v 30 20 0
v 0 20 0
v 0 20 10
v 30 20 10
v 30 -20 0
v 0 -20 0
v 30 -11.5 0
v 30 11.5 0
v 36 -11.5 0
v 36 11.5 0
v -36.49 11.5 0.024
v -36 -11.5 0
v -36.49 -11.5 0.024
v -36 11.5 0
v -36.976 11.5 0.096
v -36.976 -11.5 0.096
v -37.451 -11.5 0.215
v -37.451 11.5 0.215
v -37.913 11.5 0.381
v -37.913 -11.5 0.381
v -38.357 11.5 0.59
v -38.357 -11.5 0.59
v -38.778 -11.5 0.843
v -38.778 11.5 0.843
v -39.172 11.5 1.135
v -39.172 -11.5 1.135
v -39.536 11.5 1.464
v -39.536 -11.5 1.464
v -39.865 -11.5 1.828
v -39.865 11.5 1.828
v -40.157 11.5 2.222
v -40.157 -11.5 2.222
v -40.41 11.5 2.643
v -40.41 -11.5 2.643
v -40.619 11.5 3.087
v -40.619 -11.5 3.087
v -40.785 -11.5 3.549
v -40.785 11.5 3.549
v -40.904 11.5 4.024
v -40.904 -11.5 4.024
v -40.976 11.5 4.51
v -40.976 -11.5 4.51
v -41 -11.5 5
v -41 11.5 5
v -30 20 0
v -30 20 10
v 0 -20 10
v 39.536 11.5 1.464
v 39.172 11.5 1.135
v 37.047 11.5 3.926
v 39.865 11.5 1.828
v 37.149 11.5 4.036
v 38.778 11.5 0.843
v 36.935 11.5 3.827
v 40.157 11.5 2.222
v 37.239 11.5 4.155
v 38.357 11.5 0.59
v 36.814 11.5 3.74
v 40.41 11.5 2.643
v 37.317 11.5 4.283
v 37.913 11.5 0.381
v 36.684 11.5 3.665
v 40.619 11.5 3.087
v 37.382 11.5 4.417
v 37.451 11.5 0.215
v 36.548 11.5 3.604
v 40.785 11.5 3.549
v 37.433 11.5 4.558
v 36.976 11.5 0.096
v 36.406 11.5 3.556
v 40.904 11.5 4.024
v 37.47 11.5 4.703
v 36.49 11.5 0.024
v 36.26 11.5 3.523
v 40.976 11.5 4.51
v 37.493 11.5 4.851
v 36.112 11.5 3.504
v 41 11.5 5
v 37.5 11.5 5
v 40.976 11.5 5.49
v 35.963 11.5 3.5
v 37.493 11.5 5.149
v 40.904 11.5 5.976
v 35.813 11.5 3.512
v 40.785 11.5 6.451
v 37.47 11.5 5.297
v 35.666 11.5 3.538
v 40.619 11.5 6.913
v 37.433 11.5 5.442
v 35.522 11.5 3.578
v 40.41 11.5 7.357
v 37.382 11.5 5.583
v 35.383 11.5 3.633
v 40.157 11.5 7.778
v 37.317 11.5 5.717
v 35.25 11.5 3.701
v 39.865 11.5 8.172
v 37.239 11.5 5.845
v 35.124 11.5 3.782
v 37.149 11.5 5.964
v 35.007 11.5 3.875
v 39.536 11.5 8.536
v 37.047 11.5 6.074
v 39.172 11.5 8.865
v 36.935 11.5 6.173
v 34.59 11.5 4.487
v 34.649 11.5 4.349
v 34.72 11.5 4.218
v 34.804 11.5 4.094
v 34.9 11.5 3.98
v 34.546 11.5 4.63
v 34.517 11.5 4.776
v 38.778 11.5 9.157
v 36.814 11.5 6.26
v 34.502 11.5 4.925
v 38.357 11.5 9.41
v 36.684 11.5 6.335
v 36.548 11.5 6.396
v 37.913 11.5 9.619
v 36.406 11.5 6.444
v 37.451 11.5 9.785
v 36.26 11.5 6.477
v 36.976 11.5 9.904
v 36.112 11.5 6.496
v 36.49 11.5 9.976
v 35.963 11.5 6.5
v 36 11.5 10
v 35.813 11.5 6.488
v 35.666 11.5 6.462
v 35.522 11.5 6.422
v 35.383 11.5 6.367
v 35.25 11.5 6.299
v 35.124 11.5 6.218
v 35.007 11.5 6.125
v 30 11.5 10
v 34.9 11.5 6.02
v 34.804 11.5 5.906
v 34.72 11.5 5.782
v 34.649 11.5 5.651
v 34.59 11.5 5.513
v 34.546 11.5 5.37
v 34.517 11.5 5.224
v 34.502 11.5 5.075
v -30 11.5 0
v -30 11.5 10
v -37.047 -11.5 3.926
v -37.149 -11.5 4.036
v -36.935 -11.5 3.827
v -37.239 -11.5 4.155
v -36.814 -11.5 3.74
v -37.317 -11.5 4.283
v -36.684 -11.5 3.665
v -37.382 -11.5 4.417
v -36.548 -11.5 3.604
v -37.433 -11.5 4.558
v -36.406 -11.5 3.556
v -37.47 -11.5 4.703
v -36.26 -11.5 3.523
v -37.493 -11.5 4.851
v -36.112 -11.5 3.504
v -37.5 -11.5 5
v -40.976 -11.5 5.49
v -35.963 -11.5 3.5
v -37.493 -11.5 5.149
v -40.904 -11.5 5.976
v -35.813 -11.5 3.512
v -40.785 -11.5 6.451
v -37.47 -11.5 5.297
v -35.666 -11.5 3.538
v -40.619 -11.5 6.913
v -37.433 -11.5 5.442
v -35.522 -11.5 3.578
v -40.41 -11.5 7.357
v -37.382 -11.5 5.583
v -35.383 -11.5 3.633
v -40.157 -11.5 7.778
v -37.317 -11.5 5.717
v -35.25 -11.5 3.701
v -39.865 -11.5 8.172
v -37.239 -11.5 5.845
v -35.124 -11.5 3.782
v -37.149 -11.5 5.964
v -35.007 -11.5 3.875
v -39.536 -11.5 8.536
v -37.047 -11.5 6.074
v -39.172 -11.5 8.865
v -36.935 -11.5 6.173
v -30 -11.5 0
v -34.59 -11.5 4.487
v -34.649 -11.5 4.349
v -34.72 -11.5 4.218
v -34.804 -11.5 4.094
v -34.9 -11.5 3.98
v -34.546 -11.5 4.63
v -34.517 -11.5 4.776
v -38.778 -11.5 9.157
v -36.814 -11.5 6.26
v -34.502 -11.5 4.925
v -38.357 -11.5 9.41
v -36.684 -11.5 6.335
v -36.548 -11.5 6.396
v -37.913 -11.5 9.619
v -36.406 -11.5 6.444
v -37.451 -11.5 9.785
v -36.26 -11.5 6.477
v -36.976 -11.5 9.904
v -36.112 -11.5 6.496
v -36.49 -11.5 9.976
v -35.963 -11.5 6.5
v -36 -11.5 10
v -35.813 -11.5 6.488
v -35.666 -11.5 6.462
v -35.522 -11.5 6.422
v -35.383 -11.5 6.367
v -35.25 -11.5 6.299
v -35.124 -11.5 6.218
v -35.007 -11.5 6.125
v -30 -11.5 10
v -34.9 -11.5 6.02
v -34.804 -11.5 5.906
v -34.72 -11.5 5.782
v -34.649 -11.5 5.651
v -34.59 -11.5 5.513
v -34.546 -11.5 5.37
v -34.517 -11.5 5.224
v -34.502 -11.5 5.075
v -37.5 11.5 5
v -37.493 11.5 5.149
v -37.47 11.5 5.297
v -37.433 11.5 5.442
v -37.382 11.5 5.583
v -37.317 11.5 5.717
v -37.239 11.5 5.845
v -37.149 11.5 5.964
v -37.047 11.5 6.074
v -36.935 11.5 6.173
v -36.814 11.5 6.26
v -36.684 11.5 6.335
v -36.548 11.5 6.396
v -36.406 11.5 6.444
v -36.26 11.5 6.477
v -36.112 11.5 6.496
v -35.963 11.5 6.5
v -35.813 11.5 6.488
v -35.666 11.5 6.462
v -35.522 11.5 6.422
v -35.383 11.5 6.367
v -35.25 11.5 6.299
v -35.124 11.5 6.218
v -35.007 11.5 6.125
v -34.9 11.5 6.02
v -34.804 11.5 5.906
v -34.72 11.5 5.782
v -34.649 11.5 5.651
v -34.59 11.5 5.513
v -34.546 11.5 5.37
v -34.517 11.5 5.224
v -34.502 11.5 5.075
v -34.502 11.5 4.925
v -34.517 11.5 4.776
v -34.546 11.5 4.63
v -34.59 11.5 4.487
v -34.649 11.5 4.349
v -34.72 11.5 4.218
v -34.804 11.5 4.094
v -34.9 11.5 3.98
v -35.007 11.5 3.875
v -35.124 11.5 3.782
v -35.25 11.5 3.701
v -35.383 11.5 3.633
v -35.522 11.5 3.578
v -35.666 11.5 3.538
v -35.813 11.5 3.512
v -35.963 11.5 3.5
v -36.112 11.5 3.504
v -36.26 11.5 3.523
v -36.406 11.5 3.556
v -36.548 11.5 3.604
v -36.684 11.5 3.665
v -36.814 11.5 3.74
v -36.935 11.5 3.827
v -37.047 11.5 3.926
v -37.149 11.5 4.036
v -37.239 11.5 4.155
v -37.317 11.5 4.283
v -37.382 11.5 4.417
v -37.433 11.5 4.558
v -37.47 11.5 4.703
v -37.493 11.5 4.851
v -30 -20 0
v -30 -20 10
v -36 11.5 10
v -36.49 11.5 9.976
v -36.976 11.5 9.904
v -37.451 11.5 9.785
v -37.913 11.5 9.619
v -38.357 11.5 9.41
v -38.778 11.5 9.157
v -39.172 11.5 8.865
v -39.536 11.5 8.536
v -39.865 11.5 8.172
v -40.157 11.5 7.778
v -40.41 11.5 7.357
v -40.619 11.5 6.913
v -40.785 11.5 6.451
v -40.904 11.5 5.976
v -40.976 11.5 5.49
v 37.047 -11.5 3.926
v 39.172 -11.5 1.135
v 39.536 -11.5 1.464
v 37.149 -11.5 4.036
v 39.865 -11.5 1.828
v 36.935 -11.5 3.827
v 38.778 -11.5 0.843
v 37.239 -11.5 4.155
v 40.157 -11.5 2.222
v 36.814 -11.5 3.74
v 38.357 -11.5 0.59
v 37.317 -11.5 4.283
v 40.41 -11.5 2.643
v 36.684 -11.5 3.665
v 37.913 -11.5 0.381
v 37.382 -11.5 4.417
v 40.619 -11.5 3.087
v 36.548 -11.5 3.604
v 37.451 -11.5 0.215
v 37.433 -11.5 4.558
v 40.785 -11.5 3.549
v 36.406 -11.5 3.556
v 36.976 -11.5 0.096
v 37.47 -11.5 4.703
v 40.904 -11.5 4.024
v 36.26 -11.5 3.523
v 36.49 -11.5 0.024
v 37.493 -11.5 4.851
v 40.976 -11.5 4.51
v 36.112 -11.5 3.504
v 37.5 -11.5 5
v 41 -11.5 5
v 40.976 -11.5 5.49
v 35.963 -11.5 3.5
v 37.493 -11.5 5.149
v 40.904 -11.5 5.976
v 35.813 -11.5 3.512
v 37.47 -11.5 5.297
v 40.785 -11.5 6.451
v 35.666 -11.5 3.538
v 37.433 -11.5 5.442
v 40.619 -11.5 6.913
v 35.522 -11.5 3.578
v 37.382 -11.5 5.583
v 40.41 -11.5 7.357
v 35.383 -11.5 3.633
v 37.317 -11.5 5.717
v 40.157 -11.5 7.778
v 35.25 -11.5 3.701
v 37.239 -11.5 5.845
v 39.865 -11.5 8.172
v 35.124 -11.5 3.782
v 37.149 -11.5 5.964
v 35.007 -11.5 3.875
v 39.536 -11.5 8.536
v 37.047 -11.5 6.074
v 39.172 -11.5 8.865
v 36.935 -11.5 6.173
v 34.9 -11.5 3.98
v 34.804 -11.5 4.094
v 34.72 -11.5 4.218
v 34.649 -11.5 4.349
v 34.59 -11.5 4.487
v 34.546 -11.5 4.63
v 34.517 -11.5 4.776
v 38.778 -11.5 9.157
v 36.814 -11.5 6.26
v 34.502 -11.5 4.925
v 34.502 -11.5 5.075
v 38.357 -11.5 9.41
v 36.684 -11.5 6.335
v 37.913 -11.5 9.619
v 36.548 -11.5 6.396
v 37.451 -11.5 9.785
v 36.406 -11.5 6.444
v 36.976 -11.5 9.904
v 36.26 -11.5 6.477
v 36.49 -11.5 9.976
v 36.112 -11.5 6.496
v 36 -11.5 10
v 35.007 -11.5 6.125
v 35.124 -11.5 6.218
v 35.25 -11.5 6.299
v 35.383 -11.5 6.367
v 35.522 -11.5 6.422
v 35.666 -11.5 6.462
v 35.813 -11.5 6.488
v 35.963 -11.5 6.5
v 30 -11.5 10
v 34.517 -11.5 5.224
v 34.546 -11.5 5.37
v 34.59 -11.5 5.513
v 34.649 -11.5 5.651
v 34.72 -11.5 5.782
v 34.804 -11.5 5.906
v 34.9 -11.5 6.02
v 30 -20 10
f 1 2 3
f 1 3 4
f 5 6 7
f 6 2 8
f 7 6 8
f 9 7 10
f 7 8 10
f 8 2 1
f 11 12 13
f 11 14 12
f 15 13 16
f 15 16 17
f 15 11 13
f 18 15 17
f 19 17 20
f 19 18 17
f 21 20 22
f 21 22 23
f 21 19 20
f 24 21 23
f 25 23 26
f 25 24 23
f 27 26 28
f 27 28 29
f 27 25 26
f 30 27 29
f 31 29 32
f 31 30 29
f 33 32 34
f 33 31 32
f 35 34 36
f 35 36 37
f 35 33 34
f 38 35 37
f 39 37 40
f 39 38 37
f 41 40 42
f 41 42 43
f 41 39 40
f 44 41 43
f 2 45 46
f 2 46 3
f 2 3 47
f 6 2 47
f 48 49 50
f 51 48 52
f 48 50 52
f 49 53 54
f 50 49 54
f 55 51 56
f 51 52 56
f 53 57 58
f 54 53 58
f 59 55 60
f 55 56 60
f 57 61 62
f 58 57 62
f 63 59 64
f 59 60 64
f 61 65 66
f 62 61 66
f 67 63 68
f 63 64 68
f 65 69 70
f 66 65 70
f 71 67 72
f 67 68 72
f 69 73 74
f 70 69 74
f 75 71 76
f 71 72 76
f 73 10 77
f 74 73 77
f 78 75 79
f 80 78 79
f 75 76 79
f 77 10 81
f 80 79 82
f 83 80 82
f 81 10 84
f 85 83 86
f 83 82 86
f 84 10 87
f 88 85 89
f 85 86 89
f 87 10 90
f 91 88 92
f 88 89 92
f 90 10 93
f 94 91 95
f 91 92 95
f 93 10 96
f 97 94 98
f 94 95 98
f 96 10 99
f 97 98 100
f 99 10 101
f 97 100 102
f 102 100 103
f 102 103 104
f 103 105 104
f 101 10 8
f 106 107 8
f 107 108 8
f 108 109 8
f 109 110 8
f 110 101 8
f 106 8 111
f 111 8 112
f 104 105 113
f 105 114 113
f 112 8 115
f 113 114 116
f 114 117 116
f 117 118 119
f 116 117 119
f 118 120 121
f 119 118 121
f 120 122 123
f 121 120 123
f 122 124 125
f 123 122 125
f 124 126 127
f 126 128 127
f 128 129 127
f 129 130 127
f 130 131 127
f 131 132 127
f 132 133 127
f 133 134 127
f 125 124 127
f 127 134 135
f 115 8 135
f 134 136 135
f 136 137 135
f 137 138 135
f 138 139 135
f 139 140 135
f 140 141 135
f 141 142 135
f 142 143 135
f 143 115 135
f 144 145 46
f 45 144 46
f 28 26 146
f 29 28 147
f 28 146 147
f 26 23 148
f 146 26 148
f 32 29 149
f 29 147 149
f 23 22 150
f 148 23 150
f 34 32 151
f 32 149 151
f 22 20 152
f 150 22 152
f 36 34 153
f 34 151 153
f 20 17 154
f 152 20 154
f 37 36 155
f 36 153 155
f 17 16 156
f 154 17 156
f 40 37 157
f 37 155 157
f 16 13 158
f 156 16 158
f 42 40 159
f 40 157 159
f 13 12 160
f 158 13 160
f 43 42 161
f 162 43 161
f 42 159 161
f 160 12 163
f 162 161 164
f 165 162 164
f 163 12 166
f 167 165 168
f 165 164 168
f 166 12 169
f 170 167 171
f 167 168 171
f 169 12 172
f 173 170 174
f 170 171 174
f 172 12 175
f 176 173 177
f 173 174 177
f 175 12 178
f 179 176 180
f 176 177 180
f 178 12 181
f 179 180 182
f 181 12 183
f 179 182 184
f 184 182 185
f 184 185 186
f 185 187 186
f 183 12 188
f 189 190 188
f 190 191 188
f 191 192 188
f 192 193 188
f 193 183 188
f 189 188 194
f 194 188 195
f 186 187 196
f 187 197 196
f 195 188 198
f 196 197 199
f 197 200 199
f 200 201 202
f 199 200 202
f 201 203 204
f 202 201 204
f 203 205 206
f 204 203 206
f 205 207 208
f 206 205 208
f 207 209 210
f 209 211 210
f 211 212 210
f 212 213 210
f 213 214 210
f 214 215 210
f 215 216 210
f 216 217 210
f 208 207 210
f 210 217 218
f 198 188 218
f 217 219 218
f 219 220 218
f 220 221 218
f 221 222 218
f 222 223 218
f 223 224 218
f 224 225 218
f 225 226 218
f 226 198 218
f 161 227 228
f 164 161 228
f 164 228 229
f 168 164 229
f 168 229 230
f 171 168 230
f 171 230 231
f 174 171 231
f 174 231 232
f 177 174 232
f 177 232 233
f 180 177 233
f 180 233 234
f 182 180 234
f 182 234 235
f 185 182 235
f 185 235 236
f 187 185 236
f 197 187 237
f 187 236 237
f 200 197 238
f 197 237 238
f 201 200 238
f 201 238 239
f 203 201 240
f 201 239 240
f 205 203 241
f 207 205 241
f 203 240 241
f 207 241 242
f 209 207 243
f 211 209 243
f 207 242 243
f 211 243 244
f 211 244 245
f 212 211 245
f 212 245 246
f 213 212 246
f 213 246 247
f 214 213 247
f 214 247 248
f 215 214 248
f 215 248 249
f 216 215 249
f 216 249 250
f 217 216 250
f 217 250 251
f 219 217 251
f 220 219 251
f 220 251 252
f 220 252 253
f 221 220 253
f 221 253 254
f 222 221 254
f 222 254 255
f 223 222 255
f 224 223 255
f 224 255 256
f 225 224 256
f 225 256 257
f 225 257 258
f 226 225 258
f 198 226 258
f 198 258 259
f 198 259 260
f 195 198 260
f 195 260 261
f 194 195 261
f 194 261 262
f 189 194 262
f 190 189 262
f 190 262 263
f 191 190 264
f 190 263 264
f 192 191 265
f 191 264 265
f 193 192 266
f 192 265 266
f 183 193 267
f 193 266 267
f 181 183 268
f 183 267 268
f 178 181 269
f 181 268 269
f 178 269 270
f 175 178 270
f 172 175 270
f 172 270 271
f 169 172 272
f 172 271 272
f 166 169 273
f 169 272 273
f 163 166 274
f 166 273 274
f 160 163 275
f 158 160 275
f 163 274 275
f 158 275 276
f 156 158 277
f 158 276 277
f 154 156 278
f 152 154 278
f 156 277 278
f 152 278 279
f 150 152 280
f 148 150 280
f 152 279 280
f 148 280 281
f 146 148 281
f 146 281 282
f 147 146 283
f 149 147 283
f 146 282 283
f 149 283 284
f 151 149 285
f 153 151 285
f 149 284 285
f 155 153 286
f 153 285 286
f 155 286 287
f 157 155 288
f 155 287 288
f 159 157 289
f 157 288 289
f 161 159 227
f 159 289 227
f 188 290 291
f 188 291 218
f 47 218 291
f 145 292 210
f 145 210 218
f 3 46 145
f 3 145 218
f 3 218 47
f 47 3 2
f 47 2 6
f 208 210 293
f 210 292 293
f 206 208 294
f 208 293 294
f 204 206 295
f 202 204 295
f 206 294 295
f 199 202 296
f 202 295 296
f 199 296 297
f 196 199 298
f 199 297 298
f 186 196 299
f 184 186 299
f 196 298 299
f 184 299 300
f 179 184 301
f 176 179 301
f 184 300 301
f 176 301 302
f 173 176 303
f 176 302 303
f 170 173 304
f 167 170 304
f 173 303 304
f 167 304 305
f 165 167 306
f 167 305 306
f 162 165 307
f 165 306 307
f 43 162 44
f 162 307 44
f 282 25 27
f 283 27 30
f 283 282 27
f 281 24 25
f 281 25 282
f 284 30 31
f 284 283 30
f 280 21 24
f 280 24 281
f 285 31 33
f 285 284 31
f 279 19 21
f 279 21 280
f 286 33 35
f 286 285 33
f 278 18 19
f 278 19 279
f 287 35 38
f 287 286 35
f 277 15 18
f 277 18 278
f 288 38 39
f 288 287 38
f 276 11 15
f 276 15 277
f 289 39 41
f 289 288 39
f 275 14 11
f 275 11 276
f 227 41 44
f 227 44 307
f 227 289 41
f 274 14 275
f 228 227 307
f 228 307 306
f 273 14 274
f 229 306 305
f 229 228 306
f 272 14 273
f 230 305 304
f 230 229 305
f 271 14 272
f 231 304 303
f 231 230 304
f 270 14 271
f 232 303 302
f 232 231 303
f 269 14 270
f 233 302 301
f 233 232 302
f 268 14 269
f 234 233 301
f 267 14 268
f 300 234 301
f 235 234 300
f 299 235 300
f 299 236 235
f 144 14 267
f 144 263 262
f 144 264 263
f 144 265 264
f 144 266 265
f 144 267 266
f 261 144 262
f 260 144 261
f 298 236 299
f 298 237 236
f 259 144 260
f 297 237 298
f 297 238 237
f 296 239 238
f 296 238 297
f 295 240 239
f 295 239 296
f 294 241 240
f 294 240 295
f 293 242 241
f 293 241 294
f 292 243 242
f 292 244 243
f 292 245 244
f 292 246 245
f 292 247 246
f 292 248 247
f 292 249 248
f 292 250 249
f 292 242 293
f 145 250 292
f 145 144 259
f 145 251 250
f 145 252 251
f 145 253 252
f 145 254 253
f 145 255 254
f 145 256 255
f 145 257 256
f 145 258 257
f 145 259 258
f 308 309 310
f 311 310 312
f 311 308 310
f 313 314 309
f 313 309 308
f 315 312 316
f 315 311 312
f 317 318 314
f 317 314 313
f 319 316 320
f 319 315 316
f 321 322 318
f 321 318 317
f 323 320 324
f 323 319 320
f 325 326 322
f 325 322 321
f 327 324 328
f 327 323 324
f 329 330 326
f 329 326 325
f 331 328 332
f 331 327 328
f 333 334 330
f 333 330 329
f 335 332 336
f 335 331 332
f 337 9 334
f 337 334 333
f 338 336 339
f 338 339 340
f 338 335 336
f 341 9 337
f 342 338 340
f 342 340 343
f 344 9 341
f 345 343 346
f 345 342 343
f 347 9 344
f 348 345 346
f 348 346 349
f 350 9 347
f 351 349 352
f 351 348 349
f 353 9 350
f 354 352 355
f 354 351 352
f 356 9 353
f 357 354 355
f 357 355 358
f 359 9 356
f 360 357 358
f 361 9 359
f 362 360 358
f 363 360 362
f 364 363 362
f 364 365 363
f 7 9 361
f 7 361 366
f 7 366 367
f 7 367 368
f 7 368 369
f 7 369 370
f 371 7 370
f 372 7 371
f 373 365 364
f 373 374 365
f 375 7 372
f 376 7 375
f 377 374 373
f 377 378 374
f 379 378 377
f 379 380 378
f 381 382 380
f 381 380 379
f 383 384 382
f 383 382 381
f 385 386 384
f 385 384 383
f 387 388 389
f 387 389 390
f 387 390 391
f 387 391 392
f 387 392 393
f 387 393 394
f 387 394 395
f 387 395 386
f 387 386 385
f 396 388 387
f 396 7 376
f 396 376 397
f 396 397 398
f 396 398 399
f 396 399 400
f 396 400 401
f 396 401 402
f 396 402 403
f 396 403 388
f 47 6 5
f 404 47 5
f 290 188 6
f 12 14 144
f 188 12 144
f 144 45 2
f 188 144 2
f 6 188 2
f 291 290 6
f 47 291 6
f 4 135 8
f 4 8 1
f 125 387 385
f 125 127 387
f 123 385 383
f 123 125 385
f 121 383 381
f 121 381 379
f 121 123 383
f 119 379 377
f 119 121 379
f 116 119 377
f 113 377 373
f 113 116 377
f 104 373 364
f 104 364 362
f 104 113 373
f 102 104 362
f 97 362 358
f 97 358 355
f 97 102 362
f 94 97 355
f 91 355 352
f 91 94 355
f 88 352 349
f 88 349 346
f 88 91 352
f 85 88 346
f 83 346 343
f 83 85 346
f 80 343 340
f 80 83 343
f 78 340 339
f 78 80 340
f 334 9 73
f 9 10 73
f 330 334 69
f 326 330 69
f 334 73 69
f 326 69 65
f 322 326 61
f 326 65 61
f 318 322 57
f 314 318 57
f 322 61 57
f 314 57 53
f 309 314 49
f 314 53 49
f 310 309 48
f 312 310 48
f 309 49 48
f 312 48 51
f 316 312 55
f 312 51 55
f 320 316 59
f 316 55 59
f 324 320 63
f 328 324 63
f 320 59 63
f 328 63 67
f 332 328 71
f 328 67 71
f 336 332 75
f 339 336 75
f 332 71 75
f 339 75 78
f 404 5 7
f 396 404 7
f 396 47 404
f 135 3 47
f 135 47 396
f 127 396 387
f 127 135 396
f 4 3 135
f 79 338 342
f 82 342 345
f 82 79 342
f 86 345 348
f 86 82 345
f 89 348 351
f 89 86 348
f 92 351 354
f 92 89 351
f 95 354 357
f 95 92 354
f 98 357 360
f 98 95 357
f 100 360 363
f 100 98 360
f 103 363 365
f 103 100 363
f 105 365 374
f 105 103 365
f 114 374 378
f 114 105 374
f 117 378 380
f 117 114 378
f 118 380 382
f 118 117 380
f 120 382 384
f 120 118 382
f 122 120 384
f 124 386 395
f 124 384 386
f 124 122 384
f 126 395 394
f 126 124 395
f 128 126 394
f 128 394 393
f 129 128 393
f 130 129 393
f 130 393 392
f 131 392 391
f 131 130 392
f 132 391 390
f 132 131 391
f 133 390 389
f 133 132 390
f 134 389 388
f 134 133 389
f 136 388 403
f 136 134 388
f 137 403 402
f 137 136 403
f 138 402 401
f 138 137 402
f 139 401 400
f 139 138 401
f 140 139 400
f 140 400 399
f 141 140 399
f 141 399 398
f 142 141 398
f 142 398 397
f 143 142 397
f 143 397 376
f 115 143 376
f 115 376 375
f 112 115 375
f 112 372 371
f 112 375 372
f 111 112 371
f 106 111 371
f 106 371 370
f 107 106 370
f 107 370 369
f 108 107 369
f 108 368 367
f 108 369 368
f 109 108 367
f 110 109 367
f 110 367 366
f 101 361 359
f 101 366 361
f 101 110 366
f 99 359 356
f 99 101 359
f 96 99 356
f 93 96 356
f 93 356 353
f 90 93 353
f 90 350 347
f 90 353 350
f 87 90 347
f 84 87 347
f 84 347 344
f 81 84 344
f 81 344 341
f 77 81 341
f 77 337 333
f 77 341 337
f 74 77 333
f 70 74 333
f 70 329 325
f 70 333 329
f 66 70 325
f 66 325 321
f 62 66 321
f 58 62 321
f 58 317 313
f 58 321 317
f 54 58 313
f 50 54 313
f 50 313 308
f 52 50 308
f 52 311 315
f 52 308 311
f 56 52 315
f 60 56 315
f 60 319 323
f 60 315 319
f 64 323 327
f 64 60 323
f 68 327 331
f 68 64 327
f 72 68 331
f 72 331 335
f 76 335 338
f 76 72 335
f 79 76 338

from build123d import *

# Parameters (mm, degrees)
SKETCH_1_W          = 60
SKETCH_1_H          = 40
EXTRUDE_1_DEPTH     = 10
SKETCH_2_W          = 10
SKETCH_2_H          = 23
EXTRUDE_2_DEPTH     = 11
SKETCH_3_R          = 1.5
CUT_EXTRUDE_1_DEPTH = 30
FILLET_1_R          = 5


with BuildPart() as part:
    # 草图1 → 凸台-拉伸1 (new body)
    with BuildSketch(Plane.XY):
        Rectangle(SKETCH_1_W, SKETCH_1_H)
    extrude(amount=EXTRUDE_1_DEPTH)

    # 草图2 → 凸台-拉伸2 (add)
    with BuildSketch(Plane.ZY.offset(30)):
        with Locations((5, 0)):
            Rectangle(SKETCH_2_W, SKETCH_2_H)
    extrude_2 = extrude(amount=EXTRUDE_2_DEPTH)

    # 草图3 → 切除-拉伸1 (cut)
    with BuildSketch(Plane(origin=(0, 11.5, 0), x_dir=(1, 0, 0), z_dir=(0, 1, 0))):
        with Locations(Location((-36, -5, 0), (0, 0, 180))):
            Circle(SKETCH_3_R)
    cut_extrude_1 = extrude(amount=-CUT_EXTRUDE_1_DEPTH, mode=Mode.SUBTRACT)

    # 镜向1: 凸台-拉伸2, 切除-拉伸1 across plane
    add(extrude_2.mirror(Plane(origin=(0, 0, 0), x_dir=(0, 0, 1), z_dir=(1, 0, 0))))
    add(cut_extrude_1.mirror(Plane(origin=(0, 0, 0), x_dir=(0, 0, 1), z_dir=(1, 0, 0))), mode=Mode.SUBTRACT)

    # 圆角1
    fillet_1_edges = [part.edges().sort_by_distance(p)[0] for p in [
        (41, 0, 0),
        (41, 0, 10),
        (-41, 0, 0),
        (-41, 0, 10),
    ]]
    fillet(fillet_1_edges, radius=FILLET_1_R - 0.0001)  # a hair under: the kernel refuses the full size


with BuildPart() as body_2:
    # Split Bodies 1: the piece on the far side of the plane
    add(part.part)
    split(bisect_by=Plane(origin=(0, 0, 0), x_dir=(0, -1, 0), z_dir=(-1, 0, 0)), keep=Keep.BOTTOM)


with BuildPart() as part_1:
    add(part.part)

    # Split Bodies 1
    split(bisect_by=Plane(origin=(0, 0, 0), x_dir=(0, -1, 0), z_dir=(-1, 0, 0)), keep=Keep.TOP)


solid = Compound([body_2.part, part_1.part])
